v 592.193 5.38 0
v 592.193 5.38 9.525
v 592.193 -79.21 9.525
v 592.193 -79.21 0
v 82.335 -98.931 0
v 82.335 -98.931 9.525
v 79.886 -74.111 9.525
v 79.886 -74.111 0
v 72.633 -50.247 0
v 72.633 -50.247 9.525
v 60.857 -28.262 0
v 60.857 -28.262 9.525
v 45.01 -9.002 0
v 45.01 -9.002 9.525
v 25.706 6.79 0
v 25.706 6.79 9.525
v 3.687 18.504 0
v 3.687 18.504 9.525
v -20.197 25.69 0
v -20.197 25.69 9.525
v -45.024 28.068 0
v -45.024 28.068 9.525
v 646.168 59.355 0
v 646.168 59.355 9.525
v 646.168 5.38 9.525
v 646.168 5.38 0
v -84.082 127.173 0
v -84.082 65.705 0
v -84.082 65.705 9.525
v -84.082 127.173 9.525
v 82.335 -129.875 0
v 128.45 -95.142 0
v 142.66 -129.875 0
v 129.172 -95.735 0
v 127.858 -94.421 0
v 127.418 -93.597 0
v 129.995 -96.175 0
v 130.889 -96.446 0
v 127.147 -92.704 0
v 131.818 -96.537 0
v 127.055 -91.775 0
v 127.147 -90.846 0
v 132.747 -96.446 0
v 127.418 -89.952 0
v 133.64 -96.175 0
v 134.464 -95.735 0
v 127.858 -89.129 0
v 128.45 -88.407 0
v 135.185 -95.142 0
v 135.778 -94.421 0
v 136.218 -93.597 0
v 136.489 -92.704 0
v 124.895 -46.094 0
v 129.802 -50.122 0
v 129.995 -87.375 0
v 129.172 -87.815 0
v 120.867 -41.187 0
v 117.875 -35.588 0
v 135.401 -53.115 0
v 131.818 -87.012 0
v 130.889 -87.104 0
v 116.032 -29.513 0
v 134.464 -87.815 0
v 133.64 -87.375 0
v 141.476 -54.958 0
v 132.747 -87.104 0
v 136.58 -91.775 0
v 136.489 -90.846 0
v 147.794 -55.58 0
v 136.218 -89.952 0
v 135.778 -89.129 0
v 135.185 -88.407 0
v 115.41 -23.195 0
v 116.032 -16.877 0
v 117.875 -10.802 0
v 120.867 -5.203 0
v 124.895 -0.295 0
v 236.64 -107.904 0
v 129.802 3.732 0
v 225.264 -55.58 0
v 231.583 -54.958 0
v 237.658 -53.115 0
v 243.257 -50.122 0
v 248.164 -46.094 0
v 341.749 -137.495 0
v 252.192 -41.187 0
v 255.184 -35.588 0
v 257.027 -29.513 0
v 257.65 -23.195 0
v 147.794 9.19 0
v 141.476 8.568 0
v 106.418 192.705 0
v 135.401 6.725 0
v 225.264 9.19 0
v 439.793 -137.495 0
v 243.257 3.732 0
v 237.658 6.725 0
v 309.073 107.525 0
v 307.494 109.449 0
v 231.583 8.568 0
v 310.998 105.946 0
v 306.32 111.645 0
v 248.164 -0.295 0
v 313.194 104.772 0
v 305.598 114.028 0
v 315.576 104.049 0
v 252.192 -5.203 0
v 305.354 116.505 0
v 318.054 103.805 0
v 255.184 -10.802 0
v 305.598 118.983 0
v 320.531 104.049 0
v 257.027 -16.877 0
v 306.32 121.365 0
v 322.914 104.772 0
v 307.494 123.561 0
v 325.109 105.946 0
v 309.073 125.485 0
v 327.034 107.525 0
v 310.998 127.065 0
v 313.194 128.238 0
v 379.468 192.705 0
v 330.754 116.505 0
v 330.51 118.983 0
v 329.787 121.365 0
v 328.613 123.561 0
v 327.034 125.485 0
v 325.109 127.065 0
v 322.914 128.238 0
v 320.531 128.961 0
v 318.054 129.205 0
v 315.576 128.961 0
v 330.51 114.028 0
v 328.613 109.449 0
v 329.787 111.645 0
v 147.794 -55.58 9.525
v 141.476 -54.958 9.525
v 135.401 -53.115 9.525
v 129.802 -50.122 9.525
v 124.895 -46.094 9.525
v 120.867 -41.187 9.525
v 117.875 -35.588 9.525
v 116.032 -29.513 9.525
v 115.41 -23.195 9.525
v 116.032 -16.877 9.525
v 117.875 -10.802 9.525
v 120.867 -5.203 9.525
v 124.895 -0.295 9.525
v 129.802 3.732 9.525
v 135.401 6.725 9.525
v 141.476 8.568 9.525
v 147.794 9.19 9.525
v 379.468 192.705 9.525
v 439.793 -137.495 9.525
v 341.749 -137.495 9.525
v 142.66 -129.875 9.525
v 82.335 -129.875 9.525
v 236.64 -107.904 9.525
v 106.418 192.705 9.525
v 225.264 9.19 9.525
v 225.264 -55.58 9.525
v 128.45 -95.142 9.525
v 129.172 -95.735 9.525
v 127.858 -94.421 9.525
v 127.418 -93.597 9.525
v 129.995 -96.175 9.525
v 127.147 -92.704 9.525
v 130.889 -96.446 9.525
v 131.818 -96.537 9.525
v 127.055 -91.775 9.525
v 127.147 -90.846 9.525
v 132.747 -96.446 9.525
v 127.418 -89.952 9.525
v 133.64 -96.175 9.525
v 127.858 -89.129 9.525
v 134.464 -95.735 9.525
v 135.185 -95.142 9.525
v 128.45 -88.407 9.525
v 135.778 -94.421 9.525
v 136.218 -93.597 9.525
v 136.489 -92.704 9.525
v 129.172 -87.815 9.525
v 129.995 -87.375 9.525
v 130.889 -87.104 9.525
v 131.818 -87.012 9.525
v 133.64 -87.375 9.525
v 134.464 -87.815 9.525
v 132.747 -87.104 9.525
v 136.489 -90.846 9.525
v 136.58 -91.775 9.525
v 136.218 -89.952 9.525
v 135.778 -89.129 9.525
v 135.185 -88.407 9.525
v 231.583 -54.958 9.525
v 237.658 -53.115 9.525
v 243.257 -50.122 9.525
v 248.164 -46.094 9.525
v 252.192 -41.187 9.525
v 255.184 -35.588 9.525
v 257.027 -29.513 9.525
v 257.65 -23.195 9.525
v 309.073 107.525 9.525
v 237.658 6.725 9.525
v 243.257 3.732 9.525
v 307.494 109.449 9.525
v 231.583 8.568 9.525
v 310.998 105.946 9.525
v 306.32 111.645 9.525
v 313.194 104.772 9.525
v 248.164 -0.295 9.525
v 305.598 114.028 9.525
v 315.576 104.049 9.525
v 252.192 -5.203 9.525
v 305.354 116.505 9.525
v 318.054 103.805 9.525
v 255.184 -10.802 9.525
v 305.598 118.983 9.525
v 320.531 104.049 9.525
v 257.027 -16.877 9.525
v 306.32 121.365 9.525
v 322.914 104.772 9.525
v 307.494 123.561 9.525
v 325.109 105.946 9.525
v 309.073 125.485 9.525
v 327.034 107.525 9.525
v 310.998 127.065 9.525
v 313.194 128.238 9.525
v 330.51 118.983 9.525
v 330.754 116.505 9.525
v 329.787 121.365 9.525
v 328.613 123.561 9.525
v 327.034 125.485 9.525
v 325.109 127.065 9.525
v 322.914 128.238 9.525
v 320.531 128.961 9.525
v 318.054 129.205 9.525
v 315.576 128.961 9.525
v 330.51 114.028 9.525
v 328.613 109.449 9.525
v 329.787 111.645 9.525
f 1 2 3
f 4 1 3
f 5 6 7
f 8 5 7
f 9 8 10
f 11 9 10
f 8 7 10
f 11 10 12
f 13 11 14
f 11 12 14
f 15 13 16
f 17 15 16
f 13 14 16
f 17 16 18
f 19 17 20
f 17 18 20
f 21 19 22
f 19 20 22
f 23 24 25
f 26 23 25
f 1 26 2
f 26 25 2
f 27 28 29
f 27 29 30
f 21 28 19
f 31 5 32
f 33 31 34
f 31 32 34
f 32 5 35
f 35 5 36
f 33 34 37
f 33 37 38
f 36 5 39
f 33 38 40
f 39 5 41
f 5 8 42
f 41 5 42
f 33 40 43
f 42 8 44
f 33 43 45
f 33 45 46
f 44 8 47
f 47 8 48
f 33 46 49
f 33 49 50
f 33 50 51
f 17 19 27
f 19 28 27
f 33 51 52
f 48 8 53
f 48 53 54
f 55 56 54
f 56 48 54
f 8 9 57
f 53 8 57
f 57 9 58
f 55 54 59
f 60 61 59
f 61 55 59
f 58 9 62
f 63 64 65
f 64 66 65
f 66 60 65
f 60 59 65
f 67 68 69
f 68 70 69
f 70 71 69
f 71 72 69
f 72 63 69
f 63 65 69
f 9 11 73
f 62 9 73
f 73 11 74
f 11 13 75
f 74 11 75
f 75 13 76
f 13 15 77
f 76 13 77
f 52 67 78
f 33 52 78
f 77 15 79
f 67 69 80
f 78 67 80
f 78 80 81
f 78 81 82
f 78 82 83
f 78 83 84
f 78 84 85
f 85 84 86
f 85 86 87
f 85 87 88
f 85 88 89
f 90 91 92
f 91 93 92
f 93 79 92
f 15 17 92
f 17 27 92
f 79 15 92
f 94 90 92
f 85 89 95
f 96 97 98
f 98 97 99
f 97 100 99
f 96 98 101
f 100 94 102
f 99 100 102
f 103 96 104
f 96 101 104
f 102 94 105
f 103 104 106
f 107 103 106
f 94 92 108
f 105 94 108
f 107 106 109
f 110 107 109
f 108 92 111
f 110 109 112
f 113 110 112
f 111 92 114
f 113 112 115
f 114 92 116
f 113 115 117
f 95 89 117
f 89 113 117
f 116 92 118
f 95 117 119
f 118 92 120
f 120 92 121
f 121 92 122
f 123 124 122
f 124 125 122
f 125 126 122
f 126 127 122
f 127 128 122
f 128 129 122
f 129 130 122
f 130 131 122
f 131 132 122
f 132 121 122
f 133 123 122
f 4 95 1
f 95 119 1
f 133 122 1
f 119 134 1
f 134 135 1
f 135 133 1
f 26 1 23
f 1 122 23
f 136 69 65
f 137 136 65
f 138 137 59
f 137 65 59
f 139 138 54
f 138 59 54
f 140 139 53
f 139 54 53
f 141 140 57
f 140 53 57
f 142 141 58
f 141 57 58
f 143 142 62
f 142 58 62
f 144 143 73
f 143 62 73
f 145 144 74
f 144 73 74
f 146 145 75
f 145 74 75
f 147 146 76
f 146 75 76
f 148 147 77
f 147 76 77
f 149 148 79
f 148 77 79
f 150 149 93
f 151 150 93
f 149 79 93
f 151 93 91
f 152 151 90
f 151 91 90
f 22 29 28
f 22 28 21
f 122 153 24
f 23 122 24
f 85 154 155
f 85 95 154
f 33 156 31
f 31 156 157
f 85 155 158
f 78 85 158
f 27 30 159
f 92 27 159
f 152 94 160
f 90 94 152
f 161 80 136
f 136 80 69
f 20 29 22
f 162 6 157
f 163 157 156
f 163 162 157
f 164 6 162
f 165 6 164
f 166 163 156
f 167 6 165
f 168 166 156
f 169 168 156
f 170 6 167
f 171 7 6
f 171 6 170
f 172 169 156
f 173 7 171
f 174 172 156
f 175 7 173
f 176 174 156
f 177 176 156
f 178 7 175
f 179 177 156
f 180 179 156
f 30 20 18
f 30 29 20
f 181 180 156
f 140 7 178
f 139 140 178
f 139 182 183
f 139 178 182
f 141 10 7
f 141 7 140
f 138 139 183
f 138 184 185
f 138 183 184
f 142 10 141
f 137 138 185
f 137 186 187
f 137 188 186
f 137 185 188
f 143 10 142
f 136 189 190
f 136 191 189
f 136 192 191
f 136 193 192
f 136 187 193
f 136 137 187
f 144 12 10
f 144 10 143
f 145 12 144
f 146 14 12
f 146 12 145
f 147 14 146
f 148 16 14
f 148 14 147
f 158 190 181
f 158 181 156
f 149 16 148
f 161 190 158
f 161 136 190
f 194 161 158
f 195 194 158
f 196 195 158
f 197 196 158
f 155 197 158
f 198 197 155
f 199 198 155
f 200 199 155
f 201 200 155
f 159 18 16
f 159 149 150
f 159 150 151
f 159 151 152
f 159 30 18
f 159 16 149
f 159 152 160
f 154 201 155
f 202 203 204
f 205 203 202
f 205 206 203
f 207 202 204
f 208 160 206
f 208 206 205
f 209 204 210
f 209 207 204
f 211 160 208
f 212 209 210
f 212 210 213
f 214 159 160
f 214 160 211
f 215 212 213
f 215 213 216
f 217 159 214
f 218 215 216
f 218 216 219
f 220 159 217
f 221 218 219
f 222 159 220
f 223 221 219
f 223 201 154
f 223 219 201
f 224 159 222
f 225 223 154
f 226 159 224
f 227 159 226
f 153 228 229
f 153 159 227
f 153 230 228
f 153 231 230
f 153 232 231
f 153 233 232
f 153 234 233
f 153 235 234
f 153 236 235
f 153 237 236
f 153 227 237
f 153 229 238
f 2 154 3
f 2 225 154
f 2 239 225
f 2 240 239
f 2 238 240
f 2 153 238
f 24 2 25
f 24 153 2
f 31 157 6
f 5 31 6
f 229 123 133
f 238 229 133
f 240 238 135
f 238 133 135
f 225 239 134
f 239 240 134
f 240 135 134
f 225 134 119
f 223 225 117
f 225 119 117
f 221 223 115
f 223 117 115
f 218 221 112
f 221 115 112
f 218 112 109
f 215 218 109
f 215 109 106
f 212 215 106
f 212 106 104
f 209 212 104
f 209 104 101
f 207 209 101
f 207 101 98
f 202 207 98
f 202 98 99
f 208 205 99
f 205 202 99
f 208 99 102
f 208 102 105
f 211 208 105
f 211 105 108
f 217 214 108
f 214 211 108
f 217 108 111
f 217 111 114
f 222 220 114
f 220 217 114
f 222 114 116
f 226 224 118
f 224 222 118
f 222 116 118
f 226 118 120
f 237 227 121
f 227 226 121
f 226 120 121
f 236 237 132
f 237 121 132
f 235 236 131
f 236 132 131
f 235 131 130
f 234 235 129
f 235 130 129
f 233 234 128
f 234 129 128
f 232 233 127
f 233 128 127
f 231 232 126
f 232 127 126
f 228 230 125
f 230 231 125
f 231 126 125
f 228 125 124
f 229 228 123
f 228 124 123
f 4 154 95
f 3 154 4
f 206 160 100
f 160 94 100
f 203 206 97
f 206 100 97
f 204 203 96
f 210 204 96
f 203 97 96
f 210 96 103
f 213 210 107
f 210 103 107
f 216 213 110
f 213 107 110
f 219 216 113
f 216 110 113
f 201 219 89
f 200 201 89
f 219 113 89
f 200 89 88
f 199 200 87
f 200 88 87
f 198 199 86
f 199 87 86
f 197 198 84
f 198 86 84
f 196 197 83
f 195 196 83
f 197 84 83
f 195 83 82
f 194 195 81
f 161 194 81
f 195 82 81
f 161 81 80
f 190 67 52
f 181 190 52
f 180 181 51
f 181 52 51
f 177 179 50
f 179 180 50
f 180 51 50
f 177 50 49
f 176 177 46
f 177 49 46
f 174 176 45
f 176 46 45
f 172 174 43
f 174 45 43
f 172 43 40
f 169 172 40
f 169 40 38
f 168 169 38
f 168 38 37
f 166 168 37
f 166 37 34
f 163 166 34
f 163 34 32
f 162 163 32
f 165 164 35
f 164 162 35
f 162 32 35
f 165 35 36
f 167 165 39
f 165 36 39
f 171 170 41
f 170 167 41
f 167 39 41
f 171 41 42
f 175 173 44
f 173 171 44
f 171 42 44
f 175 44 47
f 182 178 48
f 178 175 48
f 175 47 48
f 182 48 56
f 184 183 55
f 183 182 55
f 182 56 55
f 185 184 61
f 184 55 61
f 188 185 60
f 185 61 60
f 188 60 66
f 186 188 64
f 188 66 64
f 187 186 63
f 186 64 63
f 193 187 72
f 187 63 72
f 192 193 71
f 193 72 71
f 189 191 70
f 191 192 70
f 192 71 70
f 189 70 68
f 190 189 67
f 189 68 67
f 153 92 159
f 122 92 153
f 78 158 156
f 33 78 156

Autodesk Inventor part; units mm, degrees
ref_plane "YZ Plane" through (0, 0, 0) normal (1, 0, 0) x (0, 1, 0)
ref_plane "XZ Plane" through (0, 0, 0) normal (0, 1, 0) x (-1, 0, 0)
ref_plane "XY Plane" through (0, 0, 0) normal (0, 0, 1) x (1, 0, 0)
sketch "Sketch1" plane through (0, 0, 0) normal (0, 0, 1) x (1, 0, 0)
  line L0 (-84.0821, 192.7052) -> (642.9929, 192.7052)
  line L1 (642.9929, 192.7052) -> (642.9929, -137.4948)
  line L2 (642.9929, -137.4948) -> (-84.0821, -137.4948)
  line L3 (-84.0821, -137.4948) -> (-84.0821, 192.7052)
  circle A0 centre (131.8179, -91.7748) radius 4.7625
  circle A1 centre (318.0537, 116.5052) radius 12.7
  line L4 (642.9929, -137.4948) -> (592.1929, -137.4948)
  line L5 (592.1929, -137.4948) -> (592.1929, -73.9948)
  line L6 (592.1929, -73.9948) -> (642.9929, -73.9948)
  line L7 (642.9929, -73.9948) -> (642.9929, -137.4948)
  line L8 (642.9929, 192.7052) -> (592.6352, 192.7052)
  line L9 (642.9929, 2.2052) -> (642.9929, 192.7052)
  line L10 (-84.0821, 53.0052) -> (5.7204, 53.0052) construction
  line L11 (-84.0821, 65.7052) -> (68.3179, -137.4948)
  line L12 (595.3679, 192.7052) -> (595.3679, 2.2052)
  line L13 (595.3679, 2.2052) -> (642.9929, 2.2052)
  point P0 (0, 0)
  dimension "d0" = 727.075
  dimension "d2" = 9.525
  dimension "d3" = 25.4
  dimension "d4" = 215.9
  dimension "d5" = 279.4
  dimension "d14" = 152.4
  dimension "d15" = 203.2
  dimension "d16" = 330.2
  dimension "d17" = 63.5
  dimension "d19" = 50.8
  dimension "d20" = 139.7
  dimension "d21" = 45.72
  dimension "d22" = 254
extrude "Extrusion1" add sketch "Sketch1" along normal blind 9.525 contours L0 L12 L13 L1 L6 L5 L2 L11 L3
sketch "Sketch2" plane through (0, 0, 9.525) normal (0, 0, 1) x (1, 0, 0)
  line L0 (595.3679, 2.2052) -> (595.3679, 192.7052) projected
  line L1 (595.3679, 192.7052) -> (-84.0821, 192.7052) projected
  line L2 (-84.0821, 192.7052) -> (-84.0821, 65.7052) projected
  line L3 (68.3179, -137.4948) -> (592.1929, -137.4948) projected
  line L4 (592.1929, -137.4948) -> (592.1929, -73.9948) projected
  line L5 (-84.0821, 127.1732) -> (106.4179, 192.7052)
  line L6 (379.4679, 192.7052) -> (646.1679, 59.3552)
  line L7 (595.3679, 84.7552) -> (595.3679, 192.7052)
  point P0 (0, 0)
  dimension "d25" = 190.5
  dimension "d26" = 61.468
  dimension "d28" = 196.85
  dimension "d30" = 53.975
  dimension "d31" = 212.725
extrude "Extrusion2" cut sketch "Sketch2" against normal blind 25.4
sketch "Sketch3" plane through (0, 0, 9.525) normal (0, 0, 1) x (1, 0, 0)
  line L0 (592.1929, -137.4948) -> (740.2432, -137.4948)
  line L1 (740.2432, -137.4948) -> (740.2432, 103.8052)
  line L2 (740.2432, 103.8052) -> (592.1929, 103.8052)
  line L3 (592.1929, 103.8052) -> (592.1929, -137.4948)
  point P0 (0, 0)
extrude "Extrusion3" cut sketch "Sketch3" against normal blind 25.4
sketch "Sketch4" plane through (0, 0, 9.525) normal (0, 0, 1) x (1, 0, 0)
  line L0 (592.1929, -137.4948) -> (592.1929, 86.3427) projected
  line L1 (592.1929, 86.3427) -> (379.4679, 192.7052) projected
  line L2 (68.3179, -137.4948) -> (592.1929, -137.4948) projected
  line L3 (592.1929, 86.3427) -> (646.1679, 59.3552)
  line L4 (646.1679, 59.3552) -> (646.1679, 40.3052)
  line L5 (646.1679, 40.3052) -> (592.1929, 40.3052)
  point P0 (0, 0)
  dimension "d37" = 53.975
  dimension "d38" = 19.05
extrude "Extrusion4" add sketch "Sketch4" against normal blind 9.525
sketch "Sketch5" plane through (0, 0, 9.525) normal (0, 0, 1) x (1, 0, 0)
  line L0 (592.1929, 40.3052) -> (646.1679, 40.3052)
  line L1 (646.1679, 40.3052) -> (646.1679, 5.3802)
  line L2 (646.1679, 5.3802) -> (592.1929, 5.3802)
  line L3 (592.1929, 5.3802) -> (592.1929, 40.3052)
  point P0 (0, 0)
  dimension "d41" = 34.925
extrude "Extrusion5" add sketch "Sketch5" against normal blind 9.525
sketch "Sketch6" plane through (0, 0, 9.525) normal (0, 0, 1) x (1, 0, 0)
  line L0 (-84.0821, 65.7052) -> (68.3179, -137.4948)
  line L1 (68.3179, -137.4948) -> (592.1929, -137.4948)
  line L2 (592.1929, -137.4948) -> (592.1929, 40.3052)
  line L3 (147.7945, 9.1902) -> (225.2645, 9.1902)
  line L4 (341.7489, -137.4948) -> (170.3104, -117.1748)
  line L5 (170.3104, -117.1748) -> (53.0779, -117.1748)
  line L6 (68.3179, -137.4948) -> (592.1929, -137.4948) projected
  line L7 (592.1929, -96.6594) -> (439.7929, -137.4948)
  line L8 (439.7929, -137.4948) -> (592.1929, -137.4948)
  line L9 (592.1929, -137.4948) -> (592.1929, -96.6594)
  point P0 (0, 0)
  point P1 (0, 0)
  dimension "d47" = 20.32
  dimension "d50" = 152.4
  dimension "d53" = 173.24
  dimension "d54" = 165
  dimension "d55" = 98.044
extrude "Extrusion7" cut sketch "Sketch6" against normal blind 25.4
sketch "Sketch7" plane through (0, 0, 0) normal (0, 0, -1) x (-1, 0, 0)
  line L0 (-68.3179, -137.4948) -> (-592.1929, -137.4948)
  line L1 (84.0821, 192.7052) -> (84.0821, 65.7052)
  circle A0 centre (-147.7945, -23.1948) radius 32.385
  circle A1 centre (-225.2645, -23.1948) radius 32.385
  line L2 (-225.2645, 9.1902) -> (-147.7945, 9.1902)
  line L3 (-225.2645, -55.5798) -> (-147.7945, -55.5798)
  circle A2 centre (-323.5837, 116.5052) radius 12.7
  line L4 (-595.3679, 192.7052) -> (-595.3679, 2.2052)
  line L5 (-595.3679, 2.2052) -> (-642.9929, 2.2052)
  line L6 (-642.9929, -73.9948) -> (-642.9929, 2.2052)
  line L7 (-642.9929, -73.9948) -> (-592.1929, -73.9948)
  line L8 (-592.1929, -73.9948) -> (-592.1929, -137.4948)
  line L9 (84.0821, 65.7052) -> (-68.3179, -137.4948)
  line L10 (-595.3679, 192.7052) -> (84.0821, 192.7052)
  circle A3 centre (-131.8179, -86.6948) radius 4.7625
  point P0 (0, 0)
  point P1 (0, 0)
  dimension "d56" = 64.77
  dimension "d57" = 231.8766
  dimension "d58" = 114.3
  dimension "d59" = 64.77
  dimension "d60" = 77.47
extrude "Extrusion8" cut sketch "Sketch7" against normal blind 25.4 contours A0 | A0 L3 A1 L2 | A1
sketch "Sketch8" plane through (0, 0, 9.525) normal (0, 0, 1) x (1, 0, 0)
  line L0 (-84.0821, 65.7052) -> (53.0779, -117.1748) projected
  line L1 (-84.0821, 127.1732) -> (-84.0821, 65.7052) projected
  line L2 (53.0779, -117.1748) -> (170.3104, -117.1748) projected
  arc A0 (82.3351, -98.9312) -> (-55.5071, 27.6052) centre (-44.6649, -98.9312) ccw
  line L3 (341.7489, -137.4948) -> (439.7929, -137.4948) projected
  line L4 (82.3351, -117.1748) -> (82.3351, -74.3195)
  point P0 (0, 0)
  point P1 (81.0179, -117.1748)
  dimension "d65" = 38.1
  dimension "d68" = 127
  dimension "d69" = 165.1
extrude "Extrusion9" cut sketch "Sketch8" against normal blind 25.4
sketch "Sketch12" plane through (0, 0, 9.525) normal (0, 0, 1) x (1, 0, 0)
  line L0 (341.7489, -137.4948) -> (439.7929, -137.4948) projected
  line L1 (439.7929, -137.4948) -> (592.1929, -96.6594) projected
  line L2 (592.1929, -96.6594) -> (592.1929, 5.3802) projected
  line L3 (439.7929, -137.4948) -> (592.1929, -79.2096)
  point P0 (341.4151, -137.4948)
  point P1 (0, 0)
  dimension "d85" = 17.4498
extrude "Extrusion13" cut sketch "Sketch12" against normal blind 9.525
sketch "Sketch16" plane through (0, 0, 9.525) normal (0, 0, 1) x (1, 0, 0)
  circle A0 centre (131.8179, -91.7748) radius 4.7625 projected
  line L0 (82.3351, -117.1748) -> (170.3104, -117.1748) projected
  line L1 (170.3104, -117.1748) -> (341.7489, -137.4948) projected
  line L2 (341.7489, -137.4948) -> (439.7929, -137.4948) projected
  circle A1 centre (131.8179, -91.7748) radius 38.1
  line L3 (131.8179, -129.8748) -> (82.3351, -129.8748)
  line L4 (82.3351, -129.8748) -> (277.4594, -129.8748)
  line L5 (82.3351, -129.8748) -> (82.3351, -117.1748)
  point P0 (0, 0)
  dimension "d108" = 76.2
extrude "Extrusion18" add sketch "Sketch16" against normal blind 9.525 contours L0 A1 L3 L5 | L0 A1 | L0 L1 L4 A1 picked at (139.3083, -118.9641)
sketch "Sketch17" plane through (0, 0, 9.525) normal (0, 0, 1) x (1, 0, 0)
  line L0 (82.3351, -98.9312) -> (82.3351, -129.8748) projected
  line L1 (82.3351, -129.8748) -> (277.4594, -129.8748) projected
  line L2 (277.4594, -129.8748) -> (341.7489, -137.4948) projected
  line L3 (341.7489, -137.4948) -> (236.6401, -107.9038)
  line L4 (236.6401, -107.9038) -> (142.6601, -129.8748)
  point P0 (0, 0)
  dimension "d111" = 154.305
  dimension "d112" = 21.971
  dimension "d115" = 60.325
extrude "Extrusion19" cut sketch "Sketch17" against normal blind 9.525
sketch "Sketch18" plane through (0, 0, 9.525) normal (0, 0, 1) x (1, 0, 0)
  line L0 (-84.0821, 65.7052) -> (-55.5071, 27.6052) projected
  arc A0 (82.3351, -98.9312) -> (-55.5071, 27.6052) centre (-44.6649, -98.9312) ccw projected
  line L1 (-84.0821, 65.7052) -> (-45.0245, 28.0683)
  point P0 (0, 0)
extrude "Extrusion20" cut sketch "Sketch18" against normal blind 9.525
properties part number "ShooterMountRight_NERDS"
